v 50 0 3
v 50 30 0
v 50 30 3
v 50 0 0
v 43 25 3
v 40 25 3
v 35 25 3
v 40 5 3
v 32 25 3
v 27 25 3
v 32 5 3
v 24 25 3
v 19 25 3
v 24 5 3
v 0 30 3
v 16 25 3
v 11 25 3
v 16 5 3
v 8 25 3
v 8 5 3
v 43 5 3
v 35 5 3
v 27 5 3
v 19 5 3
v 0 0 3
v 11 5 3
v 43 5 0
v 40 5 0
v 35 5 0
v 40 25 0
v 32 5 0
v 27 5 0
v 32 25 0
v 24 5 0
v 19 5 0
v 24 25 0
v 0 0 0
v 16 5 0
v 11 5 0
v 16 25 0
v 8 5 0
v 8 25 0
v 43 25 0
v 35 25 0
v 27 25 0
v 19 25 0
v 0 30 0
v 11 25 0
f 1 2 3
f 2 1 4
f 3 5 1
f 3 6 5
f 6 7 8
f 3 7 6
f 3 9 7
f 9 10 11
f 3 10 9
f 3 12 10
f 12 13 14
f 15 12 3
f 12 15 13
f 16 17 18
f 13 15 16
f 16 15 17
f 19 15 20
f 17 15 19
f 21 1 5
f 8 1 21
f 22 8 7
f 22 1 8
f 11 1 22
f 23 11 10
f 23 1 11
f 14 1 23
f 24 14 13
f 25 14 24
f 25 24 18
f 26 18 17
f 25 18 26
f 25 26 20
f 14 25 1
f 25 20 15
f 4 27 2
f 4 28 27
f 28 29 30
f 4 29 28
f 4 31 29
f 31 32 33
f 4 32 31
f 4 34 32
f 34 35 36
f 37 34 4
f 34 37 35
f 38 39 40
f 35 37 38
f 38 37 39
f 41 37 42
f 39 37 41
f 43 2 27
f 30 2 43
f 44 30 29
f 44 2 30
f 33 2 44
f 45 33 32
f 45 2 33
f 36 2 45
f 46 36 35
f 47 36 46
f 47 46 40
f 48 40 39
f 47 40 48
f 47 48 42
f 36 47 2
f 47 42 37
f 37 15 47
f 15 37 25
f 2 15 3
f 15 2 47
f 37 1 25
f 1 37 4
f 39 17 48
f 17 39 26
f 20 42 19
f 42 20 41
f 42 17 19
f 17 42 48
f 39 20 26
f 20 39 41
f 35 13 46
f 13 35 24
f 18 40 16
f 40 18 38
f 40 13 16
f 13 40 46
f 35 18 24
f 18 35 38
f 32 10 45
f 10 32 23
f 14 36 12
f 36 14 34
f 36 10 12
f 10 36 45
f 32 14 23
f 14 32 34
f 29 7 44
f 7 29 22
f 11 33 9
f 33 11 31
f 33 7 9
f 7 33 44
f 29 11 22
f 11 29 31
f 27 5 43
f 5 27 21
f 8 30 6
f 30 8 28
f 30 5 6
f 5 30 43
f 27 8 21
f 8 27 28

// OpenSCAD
// units=mm — generated by scad_emitter.py
// part=unnamed
$fn = 48;

difference() { cube([50, 30, 3]); translate([8, 5, -0.5]) cube([3, 20, 4]); translate([16, 5, -0.5]) cube([3, 20, 4]); translate([24, 5, -0.5]) cube([3, 20, 4]); translate([32, 5, -0.5]) cube([3, 20, 4]); translate([40, 5, -0.5]) cube([3, 20, 4]); }
